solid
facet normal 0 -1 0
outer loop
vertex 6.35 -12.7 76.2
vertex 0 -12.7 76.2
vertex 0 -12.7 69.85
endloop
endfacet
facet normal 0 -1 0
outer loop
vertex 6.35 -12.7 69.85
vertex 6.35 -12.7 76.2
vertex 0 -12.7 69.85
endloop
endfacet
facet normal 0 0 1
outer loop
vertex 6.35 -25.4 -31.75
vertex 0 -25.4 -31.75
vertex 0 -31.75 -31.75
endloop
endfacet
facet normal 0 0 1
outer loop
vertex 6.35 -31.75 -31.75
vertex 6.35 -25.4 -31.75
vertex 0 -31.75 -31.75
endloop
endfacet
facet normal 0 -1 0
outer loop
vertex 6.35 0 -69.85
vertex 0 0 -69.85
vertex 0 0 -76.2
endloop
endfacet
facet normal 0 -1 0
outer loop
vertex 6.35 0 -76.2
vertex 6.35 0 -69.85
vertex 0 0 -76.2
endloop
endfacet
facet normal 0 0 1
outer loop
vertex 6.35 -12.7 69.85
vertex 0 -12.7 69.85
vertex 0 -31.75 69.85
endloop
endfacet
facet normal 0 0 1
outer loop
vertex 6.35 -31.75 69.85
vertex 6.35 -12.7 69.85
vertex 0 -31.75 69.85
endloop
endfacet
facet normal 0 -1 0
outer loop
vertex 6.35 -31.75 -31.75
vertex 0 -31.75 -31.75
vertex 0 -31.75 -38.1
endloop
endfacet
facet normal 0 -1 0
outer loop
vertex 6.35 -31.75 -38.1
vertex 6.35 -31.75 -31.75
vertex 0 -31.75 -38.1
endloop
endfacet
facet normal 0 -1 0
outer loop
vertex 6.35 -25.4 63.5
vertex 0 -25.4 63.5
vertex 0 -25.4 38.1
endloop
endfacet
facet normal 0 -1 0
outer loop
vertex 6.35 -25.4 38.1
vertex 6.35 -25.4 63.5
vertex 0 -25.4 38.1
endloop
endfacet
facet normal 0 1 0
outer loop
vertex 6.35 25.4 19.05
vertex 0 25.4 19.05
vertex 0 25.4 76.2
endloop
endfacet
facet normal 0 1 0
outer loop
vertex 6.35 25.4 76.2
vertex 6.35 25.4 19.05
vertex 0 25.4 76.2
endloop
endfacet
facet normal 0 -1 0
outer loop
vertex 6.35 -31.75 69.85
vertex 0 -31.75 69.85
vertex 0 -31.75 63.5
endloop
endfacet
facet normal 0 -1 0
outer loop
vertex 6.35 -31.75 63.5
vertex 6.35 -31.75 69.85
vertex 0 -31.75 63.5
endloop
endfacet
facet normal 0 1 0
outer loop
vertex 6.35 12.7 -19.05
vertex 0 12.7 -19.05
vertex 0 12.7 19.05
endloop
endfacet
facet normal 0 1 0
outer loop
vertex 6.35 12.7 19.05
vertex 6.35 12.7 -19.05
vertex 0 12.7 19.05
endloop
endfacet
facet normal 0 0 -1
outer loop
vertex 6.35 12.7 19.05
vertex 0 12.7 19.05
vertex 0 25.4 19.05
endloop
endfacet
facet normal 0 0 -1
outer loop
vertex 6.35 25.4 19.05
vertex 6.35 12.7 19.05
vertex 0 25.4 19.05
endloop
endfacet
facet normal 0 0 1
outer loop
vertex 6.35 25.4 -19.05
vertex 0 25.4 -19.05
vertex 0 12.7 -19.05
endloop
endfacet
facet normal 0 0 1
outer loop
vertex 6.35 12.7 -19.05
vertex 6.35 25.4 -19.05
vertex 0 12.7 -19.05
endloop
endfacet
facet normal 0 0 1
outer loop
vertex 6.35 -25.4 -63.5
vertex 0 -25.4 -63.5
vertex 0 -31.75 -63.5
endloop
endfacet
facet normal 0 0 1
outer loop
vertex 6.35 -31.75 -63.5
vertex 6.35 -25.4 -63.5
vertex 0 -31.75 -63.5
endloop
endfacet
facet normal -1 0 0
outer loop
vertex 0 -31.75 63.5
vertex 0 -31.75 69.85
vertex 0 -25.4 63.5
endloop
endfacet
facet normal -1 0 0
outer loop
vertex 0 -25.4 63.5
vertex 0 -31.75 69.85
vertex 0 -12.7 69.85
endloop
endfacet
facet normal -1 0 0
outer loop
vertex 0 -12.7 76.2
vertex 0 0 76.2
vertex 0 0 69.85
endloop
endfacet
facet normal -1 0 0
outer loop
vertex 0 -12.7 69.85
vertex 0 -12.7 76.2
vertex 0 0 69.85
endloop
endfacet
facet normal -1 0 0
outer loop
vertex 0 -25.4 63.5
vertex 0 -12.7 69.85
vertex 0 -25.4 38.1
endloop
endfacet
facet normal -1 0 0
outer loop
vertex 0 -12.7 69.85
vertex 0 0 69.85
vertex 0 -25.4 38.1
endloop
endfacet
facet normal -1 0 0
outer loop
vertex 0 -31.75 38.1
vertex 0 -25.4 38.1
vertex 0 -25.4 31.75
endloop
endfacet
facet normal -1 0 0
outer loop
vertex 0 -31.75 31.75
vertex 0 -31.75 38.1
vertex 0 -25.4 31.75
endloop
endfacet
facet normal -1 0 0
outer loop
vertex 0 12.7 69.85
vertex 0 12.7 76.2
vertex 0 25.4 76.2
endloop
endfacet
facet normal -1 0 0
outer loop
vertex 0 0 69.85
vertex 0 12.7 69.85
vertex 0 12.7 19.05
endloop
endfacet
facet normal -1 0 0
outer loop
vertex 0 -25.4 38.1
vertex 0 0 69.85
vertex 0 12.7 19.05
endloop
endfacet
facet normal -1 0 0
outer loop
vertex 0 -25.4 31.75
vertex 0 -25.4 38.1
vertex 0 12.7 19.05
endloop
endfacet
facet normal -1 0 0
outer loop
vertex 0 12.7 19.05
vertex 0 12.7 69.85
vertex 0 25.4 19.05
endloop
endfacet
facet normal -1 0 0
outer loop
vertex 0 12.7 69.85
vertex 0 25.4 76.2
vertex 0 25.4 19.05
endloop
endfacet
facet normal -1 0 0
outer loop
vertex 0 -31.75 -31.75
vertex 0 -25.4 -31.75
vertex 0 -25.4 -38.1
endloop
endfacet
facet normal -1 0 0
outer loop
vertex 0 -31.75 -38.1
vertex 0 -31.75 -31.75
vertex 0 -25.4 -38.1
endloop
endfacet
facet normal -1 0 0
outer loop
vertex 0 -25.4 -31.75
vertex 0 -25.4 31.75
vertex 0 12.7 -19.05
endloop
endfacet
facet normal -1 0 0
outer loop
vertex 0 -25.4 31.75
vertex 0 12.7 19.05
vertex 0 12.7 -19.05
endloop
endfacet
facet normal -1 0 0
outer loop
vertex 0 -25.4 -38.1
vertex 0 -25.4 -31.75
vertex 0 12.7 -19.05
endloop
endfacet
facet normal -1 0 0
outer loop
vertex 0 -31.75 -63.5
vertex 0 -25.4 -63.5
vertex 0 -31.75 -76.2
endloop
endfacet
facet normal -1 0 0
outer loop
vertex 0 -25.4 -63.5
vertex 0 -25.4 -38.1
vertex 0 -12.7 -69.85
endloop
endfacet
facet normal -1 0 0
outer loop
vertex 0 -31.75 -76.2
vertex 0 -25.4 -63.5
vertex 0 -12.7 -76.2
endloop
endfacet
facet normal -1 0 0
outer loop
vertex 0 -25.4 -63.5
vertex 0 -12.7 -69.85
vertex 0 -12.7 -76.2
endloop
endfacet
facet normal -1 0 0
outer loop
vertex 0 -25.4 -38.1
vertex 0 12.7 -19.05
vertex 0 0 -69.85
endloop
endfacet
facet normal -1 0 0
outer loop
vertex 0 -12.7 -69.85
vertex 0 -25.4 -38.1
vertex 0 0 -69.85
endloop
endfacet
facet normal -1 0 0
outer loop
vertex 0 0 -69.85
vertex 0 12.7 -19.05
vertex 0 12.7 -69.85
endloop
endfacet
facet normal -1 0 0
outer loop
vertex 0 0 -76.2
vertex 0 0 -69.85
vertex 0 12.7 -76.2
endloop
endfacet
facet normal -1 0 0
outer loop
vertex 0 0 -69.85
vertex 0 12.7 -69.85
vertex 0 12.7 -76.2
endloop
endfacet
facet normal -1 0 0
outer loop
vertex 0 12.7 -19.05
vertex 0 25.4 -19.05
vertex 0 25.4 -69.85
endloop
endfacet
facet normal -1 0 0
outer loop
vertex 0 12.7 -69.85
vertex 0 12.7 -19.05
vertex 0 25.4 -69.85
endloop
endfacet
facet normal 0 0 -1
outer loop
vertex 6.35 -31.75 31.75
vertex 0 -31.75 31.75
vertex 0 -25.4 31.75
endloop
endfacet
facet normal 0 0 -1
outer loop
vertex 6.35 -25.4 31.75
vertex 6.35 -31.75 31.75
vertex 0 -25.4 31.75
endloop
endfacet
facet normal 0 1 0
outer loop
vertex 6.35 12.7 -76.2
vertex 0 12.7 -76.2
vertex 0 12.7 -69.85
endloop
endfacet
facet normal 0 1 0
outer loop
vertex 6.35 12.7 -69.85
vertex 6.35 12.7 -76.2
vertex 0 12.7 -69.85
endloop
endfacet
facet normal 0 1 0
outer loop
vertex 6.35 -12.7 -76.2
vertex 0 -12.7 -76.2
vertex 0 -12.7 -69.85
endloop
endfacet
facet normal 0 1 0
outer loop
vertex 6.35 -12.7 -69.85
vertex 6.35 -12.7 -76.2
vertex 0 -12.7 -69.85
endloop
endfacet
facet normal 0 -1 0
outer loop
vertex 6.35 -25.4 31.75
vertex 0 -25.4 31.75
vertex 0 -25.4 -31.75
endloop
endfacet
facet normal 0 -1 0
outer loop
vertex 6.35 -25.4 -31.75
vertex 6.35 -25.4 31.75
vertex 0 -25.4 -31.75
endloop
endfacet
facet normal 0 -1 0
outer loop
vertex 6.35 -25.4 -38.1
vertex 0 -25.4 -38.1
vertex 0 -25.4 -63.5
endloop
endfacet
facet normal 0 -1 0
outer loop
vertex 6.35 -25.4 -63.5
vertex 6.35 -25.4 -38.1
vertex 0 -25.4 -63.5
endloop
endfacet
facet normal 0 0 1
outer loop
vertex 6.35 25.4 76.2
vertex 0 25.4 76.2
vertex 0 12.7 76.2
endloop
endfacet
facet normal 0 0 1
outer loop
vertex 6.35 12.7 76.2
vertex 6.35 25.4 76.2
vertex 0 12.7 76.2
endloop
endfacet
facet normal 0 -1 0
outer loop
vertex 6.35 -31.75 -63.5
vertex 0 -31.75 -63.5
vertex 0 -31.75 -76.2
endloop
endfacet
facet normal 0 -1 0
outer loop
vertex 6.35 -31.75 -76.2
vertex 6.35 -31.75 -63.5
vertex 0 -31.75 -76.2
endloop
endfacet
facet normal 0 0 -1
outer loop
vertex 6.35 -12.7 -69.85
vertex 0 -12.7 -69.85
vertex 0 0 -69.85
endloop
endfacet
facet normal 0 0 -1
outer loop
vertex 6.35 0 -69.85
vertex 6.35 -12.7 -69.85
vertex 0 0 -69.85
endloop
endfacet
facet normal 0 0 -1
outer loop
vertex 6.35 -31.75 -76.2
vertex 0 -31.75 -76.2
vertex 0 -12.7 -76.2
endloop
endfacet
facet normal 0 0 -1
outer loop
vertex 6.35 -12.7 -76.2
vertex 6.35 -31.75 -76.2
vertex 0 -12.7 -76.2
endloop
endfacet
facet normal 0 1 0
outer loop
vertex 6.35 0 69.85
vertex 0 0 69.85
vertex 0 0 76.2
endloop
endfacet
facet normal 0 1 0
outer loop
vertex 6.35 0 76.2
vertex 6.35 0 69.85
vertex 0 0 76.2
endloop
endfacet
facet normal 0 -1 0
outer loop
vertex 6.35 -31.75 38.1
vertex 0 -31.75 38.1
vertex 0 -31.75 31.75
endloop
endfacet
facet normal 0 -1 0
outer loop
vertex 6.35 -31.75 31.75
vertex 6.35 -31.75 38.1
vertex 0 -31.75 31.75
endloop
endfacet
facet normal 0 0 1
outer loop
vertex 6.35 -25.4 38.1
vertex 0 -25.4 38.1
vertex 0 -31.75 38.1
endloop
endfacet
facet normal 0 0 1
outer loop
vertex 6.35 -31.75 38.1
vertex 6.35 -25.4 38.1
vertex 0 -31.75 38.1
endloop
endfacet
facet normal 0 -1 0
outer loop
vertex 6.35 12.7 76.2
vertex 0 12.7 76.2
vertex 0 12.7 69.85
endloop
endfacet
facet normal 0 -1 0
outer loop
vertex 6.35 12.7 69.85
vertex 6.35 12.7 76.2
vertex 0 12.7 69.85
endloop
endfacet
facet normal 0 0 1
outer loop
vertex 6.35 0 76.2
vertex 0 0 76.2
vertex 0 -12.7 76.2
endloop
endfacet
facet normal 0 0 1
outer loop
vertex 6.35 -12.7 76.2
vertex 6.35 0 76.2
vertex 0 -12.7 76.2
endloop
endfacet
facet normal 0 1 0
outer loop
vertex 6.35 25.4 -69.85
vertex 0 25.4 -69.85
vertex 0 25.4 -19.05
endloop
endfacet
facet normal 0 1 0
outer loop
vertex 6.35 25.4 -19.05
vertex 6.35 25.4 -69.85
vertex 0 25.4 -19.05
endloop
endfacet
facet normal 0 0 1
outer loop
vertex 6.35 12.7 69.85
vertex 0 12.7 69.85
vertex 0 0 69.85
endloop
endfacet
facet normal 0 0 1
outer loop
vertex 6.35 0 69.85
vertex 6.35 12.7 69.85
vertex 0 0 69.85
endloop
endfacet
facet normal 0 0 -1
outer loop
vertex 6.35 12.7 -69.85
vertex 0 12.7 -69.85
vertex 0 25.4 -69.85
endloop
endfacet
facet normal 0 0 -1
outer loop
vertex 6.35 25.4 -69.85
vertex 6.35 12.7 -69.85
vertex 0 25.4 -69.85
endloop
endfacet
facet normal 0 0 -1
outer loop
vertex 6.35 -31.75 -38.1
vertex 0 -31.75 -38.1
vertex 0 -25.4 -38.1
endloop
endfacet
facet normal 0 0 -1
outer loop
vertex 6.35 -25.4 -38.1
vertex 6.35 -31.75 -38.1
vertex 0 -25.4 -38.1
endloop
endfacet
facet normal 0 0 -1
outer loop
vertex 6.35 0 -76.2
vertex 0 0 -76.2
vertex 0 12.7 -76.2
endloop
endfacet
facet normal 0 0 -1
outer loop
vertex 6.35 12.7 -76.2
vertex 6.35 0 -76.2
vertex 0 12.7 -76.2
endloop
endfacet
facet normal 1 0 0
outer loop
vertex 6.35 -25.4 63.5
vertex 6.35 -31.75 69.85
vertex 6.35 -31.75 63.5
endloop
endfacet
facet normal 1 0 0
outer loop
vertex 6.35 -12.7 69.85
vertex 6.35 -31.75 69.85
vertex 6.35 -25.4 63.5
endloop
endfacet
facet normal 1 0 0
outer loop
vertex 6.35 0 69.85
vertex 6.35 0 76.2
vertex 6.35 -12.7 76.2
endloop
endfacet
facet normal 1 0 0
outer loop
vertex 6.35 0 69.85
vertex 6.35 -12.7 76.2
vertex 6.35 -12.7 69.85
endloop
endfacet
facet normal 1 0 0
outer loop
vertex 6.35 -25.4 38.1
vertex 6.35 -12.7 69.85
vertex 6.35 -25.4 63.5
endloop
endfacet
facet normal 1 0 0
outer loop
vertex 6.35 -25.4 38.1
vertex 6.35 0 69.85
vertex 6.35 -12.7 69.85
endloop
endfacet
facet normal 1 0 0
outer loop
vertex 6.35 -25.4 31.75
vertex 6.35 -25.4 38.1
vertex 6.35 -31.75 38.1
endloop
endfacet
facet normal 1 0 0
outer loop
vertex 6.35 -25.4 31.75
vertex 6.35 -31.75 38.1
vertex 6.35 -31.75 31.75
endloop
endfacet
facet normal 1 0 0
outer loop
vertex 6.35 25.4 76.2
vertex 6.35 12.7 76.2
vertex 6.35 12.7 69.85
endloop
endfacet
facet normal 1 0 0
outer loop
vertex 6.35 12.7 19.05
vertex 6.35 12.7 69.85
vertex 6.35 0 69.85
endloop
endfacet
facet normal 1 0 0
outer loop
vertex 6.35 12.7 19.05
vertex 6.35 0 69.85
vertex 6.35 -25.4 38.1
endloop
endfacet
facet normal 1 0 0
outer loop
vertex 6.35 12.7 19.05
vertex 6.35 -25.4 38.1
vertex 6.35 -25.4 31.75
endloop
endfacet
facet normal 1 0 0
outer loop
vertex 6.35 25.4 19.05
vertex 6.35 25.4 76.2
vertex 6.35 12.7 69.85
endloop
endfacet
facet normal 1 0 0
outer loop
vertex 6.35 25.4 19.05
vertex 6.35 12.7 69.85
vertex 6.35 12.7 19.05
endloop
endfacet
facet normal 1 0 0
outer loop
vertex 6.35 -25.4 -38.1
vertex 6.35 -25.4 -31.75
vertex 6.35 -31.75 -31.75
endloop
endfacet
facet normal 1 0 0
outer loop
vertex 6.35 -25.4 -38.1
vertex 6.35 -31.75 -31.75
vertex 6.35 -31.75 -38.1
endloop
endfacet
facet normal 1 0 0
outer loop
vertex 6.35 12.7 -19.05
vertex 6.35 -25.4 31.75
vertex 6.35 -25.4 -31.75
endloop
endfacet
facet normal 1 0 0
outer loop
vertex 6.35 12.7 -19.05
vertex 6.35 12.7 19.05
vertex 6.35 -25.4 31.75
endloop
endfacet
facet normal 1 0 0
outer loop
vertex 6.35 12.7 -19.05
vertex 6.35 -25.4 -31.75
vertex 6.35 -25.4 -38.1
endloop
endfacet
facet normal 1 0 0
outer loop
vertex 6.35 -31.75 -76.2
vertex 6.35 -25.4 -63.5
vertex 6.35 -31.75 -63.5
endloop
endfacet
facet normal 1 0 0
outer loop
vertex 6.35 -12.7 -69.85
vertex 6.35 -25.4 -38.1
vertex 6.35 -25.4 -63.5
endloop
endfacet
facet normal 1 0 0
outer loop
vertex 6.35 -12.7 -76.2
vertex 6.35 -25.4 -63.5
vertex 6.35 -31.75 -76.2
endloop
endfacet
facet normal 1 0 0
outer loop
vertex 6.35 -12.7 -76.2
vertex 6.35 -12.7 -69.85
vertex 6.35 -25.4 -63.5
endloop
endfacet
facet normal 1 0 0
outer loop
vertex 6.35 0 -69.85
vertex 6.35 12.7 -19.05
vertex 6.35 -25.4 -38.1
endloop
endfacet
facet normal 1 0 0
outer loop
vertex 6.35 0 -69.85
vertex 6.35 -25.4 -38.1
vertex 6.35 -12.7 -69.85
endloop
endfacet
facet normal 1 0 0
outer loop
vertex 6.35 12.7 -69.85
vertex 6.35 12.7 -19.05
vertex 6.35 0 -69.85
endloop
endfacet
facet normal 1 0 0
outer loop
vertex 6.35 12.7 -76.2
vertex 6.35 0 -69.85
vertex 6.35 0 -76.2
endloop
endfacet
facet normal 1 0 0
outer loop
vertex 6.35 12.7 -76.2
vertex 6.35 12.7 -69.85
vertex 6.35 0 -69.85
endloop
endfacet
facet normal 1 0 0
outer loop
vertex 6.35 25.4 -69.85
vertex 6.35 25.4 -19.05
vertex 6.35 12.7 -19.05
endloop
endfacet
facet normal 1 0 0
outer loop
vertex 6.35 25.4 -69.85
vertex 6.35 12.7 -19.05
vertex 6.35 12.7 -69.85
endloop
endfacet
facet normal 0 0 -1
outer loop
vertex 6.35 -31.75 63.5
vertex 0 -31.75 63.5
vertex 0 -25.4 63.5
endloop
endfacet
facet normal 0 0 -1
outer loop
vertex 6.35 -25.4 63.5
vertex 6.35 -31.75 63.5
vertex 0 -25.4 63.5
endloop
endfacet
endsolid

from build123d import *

# Parameters (mm, degrees)
BOSS_EXTRUDE1_DEPTH = 6.35
SKETCH1_4_W         = 6.35
SKETCH1_4_H         = 6.35
BOSS_EXTRUDE2_DEPTH = 6.35


with BuildPart() as part:
    # Sketch1 → Boss-Extrude1 (new body)
    with BuildSketch(Plane(origin=(0, 0, 0), x_dir=(0, 0, -1), z_dir=(1, 0, 0))):
        Polygon((-76.2, 25.4), (-76.2, 12.7), (-69.85, 12.7), (-69.85, 0), (-76.2, 0), (-76.2, -12.7), (-69.85, -12.7), (-69.85, -31.75), (-63.5, -31.75), (-63.5, -25.4), (-38.1, -25.4), (-38.1, -31.75), (-31.75, -31.75), (-31.75, -25.4), (31.75, -25.4), (31.75, -31.75), (38.1, -31.75), (38.1, -25.4), (63.5, -25.4), (63.5, -31.75), (69.85, -31.75), (69.85, -25.4), (76.2, -25.4), (76.2, -12.7), (69.85, -12.7), (69.85, 0), (76.2, 0), (76.2, 12.7), (69.85, 12.7), (69.85, 25.4), (19.05, 25.4), (19.05, 12.7), (-19.05, 12.7), (-19.05, 25.4), align=None)
    extrude(amount=BOSS_EXTRUDE1_DEPTH)

    # Sketch1<4> → Boss-Extrude2 (add)
    with BuildSketch(Plane(origin=(0, 0, 0), x_dir=(0, 0, -1), z_dir=(1, 0, 0))):
        with Locations((73.025, -28.575)):
            Rectangle(SKETCH1_4_W, SKETCH1_4_H)
    extrude(amount=BOSS_EXTRUDE2_DEPTH)


solid = part.part
